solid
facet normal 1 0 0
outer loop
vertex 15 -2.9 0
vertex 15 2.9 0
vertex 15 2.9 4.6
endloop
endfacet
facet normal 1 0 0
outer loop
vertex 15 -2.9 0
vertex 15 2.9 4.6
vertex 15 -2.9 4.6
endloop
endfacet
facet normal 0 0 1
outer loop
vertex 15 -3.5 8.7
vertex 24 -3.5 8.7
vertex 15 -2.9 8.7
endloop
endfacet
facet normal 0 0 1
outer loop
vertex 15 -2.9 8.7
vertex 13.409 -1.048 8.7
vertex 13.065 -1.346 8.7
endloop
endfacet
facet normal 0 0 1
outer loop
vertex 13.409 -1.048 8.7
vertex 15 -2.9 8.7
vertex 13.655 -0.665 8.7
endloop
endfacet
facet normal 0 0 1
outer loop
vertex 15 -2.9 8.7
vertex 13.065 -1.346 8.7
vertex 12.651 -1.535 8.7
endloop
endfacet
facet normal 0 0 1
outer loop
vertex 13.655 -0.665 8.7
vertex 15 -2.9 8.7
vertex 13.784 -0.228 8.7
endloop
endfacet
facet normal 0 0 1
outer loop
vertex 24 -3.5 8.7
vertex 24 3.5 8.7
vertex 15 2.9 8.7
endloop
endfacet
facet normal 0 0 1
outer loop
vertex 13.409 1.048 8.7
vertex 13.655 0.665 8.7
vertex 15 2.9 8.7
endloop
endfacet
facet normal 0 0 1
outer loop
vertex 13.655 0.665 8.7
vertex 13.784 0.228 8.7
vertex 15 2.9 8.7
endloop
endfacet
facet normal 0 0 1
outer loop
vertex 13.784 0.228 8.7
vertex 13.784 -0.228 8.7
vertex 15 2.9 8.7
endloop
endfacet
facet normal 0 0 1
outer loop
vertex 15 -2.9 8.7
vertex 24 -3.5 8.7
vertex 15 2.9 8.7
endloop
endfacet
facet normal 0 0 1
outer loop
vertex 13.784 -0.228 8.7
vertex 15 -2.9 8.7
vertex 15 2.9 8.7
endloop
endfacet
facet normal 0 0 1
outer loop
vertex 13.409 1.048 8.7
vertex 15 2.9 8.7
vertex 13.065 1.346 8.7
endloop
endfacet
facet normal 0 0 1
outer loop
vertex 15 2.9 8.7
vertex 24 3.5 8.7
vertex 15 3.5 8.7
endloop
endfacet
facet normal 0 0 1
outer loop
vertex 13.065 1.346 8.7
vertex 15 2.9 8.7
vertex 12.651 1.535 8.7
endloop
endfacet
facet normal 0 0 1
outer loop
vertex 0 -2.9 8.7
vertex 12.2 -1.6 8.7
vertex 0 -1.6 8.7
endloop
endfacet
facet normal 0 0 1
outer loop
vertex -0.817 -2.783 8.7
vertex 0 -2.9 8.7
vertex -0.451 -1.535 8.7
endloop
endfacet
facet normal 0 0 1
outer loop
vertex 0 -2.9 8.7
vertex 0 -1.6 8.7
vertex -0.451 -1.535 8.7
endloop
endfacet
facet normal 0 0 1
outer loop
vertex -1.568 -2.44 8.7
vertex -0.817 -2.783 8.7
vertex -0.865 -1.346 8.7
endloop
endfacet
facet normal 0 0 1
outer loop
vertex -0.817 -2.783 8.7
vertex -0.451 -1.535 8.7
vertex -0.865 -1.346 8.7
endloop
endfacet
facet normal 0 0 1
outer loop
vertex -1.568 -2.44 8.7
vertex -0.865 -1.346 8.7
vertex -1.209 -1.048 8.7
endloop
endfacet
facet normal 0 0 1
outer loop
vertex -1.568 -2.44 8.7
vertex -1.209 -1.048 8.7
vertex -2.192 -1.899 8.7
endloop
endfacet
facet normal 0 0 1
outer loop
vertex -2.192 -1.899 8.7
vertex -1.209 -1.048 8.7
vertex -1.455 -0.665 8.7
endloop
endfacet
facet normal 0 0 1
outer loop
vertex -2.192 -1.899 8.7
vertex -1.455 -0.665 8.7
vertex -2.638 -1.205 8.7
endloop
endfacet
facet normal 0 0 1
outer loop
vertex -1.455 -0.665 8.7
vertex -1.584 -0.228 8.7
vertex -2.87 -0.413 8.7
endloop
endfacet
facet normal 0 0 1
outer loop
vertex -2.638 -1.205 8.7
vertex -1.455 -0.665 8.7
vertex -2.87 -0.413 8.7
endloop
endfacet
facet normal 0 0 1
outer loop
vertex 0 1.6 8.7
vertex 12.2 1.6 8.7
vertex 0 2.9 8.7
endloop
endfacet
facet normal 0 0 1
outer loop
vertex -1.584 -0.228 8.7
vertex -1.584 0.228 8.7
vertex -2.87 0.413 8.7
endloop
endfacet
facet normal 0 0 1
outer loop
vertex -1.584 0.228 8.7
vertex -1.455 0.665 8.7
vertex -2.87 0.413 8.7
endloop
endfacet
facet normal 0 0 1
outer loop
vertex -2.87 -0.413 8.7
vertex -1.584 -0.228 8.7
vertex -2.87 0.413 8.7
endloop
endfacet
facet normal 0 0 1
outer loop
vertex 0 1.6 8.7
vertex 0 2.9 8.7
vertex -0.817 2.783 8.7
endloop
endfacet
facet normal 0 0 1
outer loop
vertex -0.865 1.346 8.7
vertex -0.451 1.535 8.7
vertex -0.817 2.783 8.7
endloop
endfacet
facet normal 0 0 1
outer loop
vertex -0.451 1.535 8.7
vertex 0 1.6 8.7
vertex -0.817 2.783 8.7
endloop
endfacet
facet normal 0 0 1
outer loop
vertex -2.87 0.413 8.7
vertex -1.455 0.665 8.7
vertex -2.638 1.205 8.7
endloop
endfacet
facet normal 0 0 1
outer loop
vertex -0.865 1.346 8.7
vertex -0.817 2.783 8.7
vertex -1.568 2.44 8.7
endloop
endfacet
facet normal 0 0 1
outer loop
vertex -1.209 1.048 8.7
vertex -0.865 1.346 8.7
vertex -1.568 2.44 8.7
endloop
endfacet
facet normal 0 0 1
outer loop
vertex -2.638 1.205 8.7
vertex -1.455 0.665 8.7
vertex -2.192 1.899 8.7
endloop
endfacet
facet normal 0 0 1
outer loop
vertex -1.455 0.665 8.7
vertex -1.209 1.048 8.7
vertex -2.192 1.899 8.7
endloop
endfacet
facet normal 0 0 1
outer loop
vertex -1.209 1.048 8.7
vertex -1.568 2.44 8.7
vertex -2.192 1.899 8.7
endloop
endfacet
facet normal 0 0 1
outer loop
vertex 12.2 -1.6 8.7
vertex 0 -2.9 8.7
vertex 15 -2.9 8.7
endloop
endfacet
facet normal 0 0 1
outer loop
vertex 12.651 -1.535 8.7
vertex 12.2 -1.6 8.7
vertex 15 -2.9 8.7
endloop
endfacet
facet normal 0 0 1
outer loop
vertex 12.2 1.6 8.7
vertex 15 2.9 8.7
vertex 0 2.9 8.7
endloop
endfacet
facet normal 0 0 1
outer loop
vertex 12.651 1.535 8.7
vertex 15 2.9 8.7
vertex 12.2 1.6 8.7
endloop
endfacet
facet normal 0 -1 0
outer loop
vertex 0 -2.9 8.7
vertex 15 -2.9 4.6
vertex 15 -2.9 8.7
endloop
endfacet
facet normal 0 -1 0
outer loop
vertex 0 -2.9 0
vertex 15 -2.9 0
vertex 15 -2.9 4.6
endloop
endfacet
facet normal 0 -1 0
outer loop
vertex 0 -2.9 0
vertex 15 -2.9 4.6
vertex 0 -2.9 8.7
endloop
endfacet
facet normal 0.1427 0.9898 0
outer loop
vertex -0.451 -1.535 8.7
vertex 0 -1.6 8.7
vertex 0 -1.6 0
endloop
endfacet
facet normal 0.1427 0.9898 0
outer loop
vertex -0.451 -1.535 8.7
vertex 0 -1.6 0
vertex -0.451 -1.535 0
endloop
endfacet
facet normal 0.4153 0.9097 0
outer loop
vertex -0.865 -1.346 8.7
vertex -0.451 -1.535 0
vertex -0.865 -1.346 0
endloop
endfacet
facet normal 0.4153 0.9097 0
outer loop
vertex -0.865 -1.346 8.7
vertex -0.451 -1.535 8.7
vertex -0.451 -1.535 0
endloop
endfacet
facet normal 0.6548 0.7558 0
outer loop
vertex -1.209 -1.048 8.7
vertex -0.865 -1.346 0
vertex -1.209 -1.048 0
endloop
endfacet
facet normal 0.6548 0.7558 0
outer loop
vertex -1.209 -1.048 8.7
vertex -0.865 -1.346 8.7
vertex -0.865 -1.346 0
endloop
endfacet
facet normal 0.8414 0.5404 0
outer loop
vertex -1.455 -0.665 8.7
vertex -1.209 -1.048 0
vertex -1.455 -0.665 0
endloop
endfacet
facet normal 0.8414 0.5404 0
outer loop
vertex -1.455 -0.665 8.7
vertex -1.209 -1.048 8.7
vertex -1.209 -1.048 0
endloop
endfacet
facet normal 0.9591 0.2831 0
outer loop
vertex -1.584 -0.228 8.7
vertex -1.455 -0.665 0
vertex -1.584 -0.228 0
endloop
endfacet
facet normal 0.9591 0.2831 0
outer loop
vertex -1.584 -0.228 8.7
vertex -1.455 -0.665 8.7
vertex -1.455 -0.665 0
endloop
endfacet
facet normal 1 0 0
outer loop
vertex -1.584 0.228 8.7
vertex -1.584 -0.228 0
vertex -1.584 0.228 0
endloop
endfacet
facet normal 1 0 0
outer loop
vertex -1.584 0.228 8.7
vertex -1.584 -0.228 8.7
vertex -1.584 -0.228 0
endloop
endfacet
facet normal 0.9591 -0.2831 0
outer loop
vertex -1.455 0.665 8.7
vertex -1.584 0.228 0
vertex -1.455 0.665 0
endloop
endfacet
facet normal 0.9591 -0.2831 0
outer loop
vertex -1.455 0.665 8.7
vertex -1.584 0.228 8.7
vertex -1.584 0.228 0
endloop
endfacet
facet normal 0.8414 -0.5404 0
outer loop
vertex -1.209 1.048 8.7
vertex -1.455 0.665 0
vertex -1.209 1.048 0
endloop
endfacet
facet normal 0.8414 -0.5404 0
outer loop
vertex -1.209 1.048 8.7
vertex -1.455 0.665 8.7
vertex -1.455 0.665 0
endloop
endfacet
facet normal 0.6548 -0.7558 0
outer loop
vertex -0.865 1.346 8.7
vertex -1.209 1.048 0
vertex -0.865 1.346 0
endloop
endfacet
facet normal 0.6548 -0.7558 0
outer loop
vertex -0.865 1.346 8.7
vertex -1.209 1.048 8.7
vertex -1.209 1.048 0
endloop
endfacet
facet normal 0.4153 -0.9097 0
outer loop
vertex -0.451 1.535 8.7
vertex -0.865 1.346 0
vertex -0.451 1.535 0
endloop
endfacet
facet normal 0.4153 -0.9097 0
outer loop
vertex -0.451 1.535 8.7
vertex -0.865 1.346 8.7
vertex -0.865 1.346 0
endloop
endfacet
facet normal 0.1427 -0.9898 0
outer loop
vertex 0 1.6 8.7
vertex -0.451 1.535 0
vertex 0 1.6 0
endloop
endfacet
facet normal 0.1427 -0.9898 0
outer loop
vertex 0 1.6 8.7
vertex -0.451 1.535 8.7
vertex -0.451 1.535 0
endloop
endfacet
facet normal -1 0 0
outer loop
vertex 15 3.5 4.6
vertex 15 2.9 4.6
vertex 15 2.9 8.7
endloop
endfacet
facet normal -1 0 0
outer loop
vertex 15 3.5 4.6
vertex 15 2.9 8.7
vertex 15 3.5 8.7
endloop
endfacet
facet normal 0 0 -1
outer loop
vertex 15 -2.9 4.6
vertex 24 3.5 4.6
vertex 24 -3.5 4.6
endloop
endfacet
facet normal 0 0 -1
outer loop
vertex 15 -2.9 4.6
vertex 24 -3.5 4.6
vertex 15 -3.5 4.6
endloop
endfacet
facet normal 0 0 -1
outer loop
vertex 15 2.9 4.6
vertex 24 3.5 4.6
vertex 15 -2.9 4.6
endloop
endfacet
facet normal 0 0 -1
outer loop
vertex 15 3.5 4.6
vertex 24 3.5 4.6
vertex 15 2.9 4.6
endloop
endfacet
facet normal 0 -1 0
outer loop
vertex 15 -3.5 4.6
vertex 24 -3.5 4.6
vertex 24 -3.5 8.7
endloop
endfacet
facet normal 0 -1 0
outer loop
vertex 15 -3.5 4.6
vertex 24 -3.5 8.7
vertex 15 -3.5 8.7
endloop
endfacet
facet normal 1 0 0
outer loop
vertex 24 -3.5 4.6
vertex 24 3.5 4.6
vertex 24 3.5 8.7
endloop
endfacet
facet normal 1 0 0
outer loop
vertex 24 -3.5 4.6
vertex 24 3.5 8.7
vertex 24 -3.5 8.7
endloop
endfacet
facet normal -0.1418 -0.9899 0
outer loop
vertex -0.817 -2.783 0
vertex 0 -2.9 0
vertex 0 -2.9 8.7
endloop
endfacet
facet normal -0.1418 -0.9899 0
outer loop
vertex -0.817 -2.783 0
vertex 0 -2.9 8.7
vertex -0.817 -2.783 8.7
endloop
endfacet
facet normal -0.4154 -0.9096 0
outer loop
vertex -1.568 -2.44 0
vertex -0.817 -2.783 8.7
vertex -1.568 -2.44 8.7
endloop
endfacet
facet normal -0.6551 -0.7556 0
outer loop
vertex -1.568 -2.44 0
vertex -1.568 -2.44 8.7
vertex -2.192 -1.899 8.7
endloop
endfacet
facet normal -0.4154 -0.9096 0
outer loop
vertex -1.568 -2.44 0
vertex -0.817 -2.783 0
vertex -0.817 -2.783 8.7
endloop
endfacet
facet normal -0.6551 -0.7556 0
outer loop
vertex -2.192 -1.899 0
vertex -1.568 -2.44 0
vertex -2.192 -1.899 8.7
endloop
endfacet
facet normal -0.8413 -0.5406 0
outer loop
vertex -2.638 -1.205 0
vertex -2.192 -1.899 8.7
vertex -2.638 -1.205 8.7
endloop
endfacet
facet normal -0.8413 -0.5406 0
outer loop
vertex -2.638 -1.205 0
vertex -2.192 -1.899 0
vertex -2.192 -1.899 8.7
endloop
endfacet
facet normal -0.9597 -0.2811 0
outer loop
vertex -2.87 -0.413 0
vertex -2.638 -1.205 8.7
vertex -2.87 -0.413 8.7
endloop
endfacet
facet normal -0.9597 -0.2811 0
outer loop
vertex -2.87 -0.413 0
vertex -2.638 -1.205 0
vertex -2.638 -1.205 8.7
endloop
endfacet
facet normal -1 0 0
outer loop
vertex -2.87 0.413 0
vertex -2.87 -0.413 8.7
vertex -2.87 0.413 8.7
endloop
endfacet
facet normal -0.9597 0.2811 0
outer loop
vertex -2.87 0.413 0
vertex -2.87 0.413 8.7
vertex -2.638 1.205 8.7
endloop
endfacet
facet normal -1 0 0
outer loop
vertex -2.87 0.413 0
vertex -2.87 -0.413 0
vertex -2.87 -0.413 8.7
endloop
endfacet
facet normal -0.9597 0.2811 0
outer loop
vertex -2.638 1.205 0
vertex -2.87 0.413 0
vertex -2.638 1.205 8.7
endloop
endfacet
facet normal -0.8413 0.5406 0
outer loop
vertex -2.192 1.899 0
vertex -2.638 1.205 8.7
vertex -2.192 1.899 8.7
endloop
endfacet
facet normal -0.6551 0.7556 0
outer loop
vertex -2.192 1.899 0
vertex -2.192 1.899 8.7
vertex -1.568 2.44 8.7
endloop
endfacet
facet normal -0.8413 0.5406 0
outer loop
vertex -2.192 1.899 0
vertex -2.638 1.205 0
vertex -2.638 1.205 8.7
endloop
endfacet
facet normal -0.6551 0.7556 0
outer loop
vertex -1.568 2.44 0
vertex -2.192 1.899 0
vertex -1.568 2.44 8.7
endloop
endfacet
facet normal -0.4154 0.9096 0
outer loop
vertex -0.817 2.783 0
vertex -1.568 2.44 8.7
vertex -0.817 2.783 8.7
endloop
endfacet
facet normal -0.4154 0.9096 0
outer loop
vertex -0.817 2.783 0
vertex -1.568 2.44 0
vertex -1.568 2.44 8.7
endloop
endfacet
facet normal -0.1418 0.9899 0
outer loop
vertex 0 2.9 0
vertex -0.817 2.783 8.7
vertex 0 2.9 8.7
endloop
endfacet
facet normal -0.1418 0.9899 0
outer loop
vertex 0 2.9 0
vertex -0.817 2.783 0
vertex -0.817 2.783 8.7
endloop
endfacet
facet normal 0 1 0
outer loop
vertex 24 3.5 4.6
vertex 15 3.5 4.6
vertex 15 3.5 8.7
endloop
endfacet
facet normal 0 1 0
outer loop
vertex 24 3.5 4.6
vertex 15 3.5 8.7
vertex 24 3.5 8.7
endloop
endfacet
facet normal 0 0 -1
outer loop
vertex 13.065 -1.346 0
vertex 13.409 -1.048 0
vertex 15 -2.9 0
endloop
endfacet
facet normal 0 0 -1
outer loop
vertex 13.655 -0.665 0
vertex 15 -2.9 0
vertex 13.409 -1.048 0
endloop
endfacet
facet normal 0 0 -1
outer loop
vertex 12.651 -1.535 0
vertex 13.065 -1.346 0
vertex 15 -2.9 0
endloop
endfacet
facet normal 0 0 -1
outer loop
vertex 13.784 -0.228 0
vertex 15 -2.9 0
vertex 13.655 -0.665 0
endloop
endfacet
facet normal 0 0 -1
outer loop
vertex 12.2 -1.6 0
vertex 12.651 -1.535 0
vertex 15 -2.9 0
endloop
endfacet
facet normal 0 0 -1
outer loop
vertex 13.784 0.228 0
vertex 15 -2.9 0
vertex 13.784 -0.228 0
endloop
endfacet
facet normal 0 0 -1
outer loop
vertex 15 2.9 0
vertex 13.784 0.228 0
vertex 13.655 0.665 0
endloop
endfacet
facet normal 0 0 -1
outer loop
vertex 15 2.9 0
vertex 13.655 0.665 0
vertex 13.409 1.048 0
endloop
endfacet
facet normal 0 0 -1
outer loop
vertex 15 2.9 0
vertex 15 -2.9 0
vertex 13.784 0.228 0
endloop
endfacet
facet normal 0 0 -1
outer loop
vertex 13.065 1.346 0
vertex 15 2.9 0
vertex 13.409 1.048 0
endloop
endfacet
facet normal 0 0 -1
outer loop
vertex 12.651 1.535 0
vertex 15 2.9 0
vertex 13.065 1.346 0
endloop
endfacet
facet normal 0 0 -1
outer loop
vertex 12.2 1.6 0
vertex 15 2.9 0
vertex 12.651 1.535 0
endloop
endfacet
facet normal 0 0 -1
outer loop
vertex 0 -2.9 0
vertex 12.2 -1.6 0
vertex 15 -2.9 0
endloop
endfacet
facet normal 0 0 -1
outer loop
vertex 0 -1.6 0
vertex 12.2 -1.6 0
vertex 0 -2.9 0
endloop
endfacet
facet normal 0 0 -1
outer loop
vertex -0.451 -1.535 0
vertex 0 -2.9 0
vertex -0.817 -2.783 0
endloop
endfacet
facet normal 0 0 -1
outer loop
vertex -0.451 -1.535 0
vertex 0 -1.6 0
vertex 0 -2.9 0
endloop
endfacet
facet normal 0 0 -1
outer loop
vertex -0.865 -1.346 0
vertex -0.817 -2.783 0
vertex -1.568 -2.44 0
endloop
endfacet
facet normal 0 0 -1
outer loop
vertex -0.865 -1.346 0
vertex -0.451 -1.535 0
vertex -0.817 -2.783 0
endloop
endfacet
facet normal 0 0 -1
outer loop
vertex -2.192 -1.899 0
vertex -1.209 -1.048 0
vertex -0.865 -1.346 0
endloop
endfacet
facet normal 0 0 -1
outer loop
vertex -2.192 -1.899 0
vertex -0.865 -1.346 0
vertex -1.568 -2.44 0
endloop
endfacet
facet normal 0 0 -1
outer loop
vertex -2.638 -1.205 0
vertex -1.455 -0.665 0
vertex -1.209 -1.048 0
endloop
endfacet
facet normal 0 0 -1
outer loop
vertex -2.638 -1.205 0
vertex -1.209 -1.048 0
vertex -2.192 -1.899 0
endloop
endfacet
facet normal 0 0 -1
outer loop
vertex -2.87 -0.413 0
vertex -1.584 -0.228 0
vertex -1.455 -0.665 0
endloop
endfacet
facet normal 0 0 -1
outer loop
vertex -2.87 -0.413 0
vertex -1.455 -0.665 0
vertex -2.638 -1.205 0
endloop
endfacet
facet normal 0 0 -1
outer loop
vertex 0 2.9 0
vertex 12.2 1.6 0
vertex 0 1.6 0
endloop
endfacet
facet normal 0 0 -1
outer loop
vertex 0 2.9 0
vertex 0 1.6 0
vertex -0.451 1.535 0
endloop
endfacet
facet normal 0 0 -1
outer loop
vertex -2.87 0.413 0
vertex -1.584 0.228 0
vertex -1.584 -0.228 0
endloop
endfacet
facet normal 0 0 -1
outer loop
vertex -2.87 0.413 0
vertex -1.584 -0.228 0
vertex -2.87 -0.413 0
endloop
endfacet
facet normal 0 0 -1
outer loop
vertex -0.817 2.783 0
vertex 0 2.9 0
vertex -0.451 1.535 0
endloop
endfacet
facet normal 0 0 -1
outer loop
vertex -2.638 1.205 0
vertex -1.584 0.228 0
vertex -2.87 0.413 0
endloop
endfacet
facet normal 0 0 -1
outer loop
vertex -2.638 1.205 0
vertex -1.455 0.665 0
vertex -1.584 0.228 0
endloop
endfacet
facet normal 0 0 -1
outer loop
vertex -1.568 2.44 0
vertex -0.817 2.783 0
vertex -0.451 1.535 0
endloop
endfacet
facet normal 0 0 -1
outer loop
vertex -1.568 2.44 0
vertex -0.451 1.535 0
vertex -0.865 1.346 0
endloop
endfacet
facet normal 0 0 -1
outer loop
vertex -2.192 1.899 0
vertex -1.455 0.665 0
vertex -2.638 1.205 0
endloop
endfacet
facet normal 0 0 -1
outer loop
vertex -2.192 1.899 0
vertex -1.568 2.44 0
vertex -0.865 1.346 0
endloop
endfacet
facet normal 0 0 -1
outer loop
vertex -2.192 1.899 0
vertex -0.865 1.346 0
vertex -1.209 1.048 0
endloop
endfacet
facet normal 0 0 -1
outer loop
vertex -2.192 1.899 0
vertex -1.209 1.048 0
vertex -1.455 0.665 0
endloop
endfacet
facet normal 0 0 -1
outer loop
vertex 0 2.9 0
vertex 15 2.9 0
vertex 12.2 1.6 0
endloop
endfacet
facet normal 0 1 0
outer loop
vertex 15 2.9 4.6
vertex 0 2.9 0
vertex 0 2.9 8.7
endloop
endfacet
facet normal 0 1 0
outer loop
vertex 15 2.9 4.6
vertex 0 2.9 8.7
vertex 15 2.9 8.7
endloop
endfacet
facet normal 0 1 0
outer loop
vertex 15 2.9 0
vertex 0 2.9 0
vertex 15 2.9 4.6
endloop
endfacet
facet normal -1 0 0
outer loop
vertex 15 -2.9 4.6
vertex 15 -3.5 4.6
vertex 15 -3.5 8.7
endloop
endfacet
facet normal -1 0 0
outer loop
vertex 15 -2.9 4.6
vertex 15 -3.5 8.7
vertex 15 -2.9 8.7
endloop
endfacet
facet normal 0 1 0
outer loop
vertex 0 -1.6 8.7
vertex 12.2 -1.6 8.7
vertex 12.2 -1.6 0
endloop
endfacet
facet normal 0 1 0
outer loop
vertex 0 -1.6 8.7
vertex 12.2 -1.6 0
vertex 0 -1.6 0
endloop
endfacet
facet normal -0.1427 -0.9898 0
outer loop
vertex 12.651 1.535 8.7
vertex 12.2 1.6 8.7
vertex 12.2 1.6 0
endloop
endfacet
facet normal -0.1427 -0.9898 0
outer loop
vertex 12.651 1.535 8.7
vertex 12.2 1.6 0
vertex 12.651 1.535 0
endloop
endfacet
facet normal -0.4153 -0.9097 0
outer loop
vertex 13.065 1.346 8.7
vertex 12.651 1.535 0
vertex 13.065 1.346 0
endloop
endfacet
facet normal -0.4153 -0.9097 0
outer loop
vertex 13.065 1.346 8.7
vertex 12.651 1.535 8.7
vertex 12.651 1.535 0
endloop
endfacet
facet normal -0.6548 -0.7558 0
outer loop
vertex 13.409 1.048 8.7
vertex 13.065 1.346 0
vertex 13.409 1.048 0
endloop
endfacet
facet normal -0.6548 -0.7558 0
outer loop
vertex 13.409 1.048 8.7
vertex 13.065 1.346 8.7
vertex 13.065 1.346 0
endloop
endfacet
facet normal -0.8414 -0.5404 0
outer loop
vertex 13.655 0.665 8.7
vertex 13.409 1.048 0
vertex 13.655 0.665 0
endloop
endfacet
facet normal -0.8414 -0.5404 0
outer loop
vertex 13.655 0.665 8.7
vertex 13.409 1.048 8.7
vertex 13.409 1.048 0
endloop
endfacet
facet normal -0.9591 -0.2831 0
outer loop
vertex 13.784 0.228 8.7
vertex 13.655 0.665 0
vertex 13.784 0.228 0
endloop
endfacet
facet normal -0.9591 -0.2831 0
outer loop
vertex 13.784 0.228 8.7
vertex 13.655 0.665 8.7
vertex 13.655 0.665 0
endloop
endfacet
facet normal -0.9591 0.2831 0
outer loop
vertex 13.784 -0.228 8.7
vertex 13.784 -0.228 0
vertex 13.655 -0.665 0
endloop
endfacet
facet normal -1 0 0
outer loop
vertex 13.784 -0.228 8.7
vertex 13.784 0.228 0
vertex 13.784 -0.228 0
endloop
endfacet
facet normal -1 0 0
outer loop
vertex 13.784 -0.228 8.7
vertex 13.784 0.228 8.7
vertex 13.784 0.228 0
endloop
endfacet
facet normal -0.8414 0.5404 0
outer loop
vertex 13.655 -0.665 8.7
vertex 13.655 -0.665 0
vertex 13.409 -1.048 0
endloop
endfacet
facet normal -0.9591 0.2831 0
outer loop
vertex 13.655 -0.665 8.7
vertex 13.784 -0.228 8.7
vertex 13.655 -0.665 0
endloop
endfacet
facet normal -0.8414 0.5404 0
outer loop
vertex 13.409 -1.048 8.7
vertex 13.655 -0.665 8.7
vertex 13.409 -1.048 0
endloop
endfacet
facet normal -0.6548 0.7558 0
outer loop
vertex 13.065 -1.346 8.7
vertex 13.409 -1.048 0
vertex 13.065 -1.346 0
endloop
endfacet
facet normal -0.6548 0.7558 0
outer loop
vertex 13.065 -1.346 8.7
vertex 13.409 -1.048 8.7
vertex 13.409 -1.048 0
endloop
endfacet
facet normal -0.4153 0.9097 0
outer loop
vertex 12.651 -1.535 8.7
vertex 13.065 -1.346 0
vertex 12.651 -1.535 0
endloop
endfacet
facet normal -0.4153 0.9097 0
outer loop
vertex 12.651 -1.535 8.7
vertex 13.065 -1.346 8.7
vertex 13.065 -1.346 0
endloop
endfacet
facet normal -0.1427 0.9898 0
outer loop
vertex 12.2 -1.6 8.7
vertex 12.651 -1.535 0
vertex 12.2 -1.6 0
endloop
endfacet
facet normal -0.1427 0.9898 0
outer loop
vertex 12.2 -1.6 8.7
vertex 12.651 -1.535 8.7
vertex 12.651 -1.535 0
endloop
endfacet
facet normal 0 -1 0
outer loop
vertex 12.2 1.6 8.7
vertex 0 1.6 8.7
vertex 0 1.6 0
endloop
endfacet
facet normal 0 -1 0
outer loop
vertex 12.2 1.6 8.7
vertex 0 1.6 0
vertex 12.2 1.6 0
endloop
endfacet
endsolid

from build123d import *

# Parameters (mm, degrees)
EXTRUDE_1_DEPTH     = 4.6
EXTRUDE_2_DEPTH     = 4.1
CUT_EXTRUDE_1_DEPTH = 26.767033201


with BuildPart() as part:
    # Эскиз1 → Бобышка-Вытянуть1 (new body)
    with BuildSketch(Plane.XY):
        with BuildLine():
            Line((0, 2.9), (15, 2.9))
            Line((15, 2.9), (15, -2.9))
            Line((15, -2.9), (0, -2.9))
            ThreePointArc((0, -2.9), (-2.9, 0), (0, 2.9))
        make_face()
    extrude(amount=EXTRUDE_1_DEPTH)

    # Эскиз2 → Бобышка-Вытянуть2 (add)
    with BuildSketch(Plane.XY.offset(4.6)):
        with BuildLine():
            Line((24, 3.5), (24, -3.5))
            Line((24, -3.5), (15, -3.5))
            Line((15, -3.5), (15, -2.9))
            Line((15, -2.9), (0, -2.9))
            ThreePointArc((0, -2.9), (-2.9, 0), (0, 2.9))
            Line((0, 2.9), (15, 2.9))
            Line((15, 2.9), (15, 3.5))
            Line((15, 3.5), (24, 3.5))
        make_face()
    extrude(amount=EXTRUDE_2_DEPTH)

    # Эскиз3 → Вырез-Вытянуть1 (cut, through all)
    with BuildSketch(Plane.XY.offset(8.7)):
        with BuildLine():
            Line((0, 1.6), (12.2, 1.6))
            ThreePointArc((12.2, 1.6), (13.8, 0), (12.2, -1.6))
            Line((12.2, -1.6), (0, -1.6))
            ThreePointArc((0, -1.6), (-1.6, 0), (0, 1.6))
        make_face()
    extrude(amount=-CUT_EXTRUDE_1_DEPTH, mode=Mode.SUBTRACT)


solid = part.part
